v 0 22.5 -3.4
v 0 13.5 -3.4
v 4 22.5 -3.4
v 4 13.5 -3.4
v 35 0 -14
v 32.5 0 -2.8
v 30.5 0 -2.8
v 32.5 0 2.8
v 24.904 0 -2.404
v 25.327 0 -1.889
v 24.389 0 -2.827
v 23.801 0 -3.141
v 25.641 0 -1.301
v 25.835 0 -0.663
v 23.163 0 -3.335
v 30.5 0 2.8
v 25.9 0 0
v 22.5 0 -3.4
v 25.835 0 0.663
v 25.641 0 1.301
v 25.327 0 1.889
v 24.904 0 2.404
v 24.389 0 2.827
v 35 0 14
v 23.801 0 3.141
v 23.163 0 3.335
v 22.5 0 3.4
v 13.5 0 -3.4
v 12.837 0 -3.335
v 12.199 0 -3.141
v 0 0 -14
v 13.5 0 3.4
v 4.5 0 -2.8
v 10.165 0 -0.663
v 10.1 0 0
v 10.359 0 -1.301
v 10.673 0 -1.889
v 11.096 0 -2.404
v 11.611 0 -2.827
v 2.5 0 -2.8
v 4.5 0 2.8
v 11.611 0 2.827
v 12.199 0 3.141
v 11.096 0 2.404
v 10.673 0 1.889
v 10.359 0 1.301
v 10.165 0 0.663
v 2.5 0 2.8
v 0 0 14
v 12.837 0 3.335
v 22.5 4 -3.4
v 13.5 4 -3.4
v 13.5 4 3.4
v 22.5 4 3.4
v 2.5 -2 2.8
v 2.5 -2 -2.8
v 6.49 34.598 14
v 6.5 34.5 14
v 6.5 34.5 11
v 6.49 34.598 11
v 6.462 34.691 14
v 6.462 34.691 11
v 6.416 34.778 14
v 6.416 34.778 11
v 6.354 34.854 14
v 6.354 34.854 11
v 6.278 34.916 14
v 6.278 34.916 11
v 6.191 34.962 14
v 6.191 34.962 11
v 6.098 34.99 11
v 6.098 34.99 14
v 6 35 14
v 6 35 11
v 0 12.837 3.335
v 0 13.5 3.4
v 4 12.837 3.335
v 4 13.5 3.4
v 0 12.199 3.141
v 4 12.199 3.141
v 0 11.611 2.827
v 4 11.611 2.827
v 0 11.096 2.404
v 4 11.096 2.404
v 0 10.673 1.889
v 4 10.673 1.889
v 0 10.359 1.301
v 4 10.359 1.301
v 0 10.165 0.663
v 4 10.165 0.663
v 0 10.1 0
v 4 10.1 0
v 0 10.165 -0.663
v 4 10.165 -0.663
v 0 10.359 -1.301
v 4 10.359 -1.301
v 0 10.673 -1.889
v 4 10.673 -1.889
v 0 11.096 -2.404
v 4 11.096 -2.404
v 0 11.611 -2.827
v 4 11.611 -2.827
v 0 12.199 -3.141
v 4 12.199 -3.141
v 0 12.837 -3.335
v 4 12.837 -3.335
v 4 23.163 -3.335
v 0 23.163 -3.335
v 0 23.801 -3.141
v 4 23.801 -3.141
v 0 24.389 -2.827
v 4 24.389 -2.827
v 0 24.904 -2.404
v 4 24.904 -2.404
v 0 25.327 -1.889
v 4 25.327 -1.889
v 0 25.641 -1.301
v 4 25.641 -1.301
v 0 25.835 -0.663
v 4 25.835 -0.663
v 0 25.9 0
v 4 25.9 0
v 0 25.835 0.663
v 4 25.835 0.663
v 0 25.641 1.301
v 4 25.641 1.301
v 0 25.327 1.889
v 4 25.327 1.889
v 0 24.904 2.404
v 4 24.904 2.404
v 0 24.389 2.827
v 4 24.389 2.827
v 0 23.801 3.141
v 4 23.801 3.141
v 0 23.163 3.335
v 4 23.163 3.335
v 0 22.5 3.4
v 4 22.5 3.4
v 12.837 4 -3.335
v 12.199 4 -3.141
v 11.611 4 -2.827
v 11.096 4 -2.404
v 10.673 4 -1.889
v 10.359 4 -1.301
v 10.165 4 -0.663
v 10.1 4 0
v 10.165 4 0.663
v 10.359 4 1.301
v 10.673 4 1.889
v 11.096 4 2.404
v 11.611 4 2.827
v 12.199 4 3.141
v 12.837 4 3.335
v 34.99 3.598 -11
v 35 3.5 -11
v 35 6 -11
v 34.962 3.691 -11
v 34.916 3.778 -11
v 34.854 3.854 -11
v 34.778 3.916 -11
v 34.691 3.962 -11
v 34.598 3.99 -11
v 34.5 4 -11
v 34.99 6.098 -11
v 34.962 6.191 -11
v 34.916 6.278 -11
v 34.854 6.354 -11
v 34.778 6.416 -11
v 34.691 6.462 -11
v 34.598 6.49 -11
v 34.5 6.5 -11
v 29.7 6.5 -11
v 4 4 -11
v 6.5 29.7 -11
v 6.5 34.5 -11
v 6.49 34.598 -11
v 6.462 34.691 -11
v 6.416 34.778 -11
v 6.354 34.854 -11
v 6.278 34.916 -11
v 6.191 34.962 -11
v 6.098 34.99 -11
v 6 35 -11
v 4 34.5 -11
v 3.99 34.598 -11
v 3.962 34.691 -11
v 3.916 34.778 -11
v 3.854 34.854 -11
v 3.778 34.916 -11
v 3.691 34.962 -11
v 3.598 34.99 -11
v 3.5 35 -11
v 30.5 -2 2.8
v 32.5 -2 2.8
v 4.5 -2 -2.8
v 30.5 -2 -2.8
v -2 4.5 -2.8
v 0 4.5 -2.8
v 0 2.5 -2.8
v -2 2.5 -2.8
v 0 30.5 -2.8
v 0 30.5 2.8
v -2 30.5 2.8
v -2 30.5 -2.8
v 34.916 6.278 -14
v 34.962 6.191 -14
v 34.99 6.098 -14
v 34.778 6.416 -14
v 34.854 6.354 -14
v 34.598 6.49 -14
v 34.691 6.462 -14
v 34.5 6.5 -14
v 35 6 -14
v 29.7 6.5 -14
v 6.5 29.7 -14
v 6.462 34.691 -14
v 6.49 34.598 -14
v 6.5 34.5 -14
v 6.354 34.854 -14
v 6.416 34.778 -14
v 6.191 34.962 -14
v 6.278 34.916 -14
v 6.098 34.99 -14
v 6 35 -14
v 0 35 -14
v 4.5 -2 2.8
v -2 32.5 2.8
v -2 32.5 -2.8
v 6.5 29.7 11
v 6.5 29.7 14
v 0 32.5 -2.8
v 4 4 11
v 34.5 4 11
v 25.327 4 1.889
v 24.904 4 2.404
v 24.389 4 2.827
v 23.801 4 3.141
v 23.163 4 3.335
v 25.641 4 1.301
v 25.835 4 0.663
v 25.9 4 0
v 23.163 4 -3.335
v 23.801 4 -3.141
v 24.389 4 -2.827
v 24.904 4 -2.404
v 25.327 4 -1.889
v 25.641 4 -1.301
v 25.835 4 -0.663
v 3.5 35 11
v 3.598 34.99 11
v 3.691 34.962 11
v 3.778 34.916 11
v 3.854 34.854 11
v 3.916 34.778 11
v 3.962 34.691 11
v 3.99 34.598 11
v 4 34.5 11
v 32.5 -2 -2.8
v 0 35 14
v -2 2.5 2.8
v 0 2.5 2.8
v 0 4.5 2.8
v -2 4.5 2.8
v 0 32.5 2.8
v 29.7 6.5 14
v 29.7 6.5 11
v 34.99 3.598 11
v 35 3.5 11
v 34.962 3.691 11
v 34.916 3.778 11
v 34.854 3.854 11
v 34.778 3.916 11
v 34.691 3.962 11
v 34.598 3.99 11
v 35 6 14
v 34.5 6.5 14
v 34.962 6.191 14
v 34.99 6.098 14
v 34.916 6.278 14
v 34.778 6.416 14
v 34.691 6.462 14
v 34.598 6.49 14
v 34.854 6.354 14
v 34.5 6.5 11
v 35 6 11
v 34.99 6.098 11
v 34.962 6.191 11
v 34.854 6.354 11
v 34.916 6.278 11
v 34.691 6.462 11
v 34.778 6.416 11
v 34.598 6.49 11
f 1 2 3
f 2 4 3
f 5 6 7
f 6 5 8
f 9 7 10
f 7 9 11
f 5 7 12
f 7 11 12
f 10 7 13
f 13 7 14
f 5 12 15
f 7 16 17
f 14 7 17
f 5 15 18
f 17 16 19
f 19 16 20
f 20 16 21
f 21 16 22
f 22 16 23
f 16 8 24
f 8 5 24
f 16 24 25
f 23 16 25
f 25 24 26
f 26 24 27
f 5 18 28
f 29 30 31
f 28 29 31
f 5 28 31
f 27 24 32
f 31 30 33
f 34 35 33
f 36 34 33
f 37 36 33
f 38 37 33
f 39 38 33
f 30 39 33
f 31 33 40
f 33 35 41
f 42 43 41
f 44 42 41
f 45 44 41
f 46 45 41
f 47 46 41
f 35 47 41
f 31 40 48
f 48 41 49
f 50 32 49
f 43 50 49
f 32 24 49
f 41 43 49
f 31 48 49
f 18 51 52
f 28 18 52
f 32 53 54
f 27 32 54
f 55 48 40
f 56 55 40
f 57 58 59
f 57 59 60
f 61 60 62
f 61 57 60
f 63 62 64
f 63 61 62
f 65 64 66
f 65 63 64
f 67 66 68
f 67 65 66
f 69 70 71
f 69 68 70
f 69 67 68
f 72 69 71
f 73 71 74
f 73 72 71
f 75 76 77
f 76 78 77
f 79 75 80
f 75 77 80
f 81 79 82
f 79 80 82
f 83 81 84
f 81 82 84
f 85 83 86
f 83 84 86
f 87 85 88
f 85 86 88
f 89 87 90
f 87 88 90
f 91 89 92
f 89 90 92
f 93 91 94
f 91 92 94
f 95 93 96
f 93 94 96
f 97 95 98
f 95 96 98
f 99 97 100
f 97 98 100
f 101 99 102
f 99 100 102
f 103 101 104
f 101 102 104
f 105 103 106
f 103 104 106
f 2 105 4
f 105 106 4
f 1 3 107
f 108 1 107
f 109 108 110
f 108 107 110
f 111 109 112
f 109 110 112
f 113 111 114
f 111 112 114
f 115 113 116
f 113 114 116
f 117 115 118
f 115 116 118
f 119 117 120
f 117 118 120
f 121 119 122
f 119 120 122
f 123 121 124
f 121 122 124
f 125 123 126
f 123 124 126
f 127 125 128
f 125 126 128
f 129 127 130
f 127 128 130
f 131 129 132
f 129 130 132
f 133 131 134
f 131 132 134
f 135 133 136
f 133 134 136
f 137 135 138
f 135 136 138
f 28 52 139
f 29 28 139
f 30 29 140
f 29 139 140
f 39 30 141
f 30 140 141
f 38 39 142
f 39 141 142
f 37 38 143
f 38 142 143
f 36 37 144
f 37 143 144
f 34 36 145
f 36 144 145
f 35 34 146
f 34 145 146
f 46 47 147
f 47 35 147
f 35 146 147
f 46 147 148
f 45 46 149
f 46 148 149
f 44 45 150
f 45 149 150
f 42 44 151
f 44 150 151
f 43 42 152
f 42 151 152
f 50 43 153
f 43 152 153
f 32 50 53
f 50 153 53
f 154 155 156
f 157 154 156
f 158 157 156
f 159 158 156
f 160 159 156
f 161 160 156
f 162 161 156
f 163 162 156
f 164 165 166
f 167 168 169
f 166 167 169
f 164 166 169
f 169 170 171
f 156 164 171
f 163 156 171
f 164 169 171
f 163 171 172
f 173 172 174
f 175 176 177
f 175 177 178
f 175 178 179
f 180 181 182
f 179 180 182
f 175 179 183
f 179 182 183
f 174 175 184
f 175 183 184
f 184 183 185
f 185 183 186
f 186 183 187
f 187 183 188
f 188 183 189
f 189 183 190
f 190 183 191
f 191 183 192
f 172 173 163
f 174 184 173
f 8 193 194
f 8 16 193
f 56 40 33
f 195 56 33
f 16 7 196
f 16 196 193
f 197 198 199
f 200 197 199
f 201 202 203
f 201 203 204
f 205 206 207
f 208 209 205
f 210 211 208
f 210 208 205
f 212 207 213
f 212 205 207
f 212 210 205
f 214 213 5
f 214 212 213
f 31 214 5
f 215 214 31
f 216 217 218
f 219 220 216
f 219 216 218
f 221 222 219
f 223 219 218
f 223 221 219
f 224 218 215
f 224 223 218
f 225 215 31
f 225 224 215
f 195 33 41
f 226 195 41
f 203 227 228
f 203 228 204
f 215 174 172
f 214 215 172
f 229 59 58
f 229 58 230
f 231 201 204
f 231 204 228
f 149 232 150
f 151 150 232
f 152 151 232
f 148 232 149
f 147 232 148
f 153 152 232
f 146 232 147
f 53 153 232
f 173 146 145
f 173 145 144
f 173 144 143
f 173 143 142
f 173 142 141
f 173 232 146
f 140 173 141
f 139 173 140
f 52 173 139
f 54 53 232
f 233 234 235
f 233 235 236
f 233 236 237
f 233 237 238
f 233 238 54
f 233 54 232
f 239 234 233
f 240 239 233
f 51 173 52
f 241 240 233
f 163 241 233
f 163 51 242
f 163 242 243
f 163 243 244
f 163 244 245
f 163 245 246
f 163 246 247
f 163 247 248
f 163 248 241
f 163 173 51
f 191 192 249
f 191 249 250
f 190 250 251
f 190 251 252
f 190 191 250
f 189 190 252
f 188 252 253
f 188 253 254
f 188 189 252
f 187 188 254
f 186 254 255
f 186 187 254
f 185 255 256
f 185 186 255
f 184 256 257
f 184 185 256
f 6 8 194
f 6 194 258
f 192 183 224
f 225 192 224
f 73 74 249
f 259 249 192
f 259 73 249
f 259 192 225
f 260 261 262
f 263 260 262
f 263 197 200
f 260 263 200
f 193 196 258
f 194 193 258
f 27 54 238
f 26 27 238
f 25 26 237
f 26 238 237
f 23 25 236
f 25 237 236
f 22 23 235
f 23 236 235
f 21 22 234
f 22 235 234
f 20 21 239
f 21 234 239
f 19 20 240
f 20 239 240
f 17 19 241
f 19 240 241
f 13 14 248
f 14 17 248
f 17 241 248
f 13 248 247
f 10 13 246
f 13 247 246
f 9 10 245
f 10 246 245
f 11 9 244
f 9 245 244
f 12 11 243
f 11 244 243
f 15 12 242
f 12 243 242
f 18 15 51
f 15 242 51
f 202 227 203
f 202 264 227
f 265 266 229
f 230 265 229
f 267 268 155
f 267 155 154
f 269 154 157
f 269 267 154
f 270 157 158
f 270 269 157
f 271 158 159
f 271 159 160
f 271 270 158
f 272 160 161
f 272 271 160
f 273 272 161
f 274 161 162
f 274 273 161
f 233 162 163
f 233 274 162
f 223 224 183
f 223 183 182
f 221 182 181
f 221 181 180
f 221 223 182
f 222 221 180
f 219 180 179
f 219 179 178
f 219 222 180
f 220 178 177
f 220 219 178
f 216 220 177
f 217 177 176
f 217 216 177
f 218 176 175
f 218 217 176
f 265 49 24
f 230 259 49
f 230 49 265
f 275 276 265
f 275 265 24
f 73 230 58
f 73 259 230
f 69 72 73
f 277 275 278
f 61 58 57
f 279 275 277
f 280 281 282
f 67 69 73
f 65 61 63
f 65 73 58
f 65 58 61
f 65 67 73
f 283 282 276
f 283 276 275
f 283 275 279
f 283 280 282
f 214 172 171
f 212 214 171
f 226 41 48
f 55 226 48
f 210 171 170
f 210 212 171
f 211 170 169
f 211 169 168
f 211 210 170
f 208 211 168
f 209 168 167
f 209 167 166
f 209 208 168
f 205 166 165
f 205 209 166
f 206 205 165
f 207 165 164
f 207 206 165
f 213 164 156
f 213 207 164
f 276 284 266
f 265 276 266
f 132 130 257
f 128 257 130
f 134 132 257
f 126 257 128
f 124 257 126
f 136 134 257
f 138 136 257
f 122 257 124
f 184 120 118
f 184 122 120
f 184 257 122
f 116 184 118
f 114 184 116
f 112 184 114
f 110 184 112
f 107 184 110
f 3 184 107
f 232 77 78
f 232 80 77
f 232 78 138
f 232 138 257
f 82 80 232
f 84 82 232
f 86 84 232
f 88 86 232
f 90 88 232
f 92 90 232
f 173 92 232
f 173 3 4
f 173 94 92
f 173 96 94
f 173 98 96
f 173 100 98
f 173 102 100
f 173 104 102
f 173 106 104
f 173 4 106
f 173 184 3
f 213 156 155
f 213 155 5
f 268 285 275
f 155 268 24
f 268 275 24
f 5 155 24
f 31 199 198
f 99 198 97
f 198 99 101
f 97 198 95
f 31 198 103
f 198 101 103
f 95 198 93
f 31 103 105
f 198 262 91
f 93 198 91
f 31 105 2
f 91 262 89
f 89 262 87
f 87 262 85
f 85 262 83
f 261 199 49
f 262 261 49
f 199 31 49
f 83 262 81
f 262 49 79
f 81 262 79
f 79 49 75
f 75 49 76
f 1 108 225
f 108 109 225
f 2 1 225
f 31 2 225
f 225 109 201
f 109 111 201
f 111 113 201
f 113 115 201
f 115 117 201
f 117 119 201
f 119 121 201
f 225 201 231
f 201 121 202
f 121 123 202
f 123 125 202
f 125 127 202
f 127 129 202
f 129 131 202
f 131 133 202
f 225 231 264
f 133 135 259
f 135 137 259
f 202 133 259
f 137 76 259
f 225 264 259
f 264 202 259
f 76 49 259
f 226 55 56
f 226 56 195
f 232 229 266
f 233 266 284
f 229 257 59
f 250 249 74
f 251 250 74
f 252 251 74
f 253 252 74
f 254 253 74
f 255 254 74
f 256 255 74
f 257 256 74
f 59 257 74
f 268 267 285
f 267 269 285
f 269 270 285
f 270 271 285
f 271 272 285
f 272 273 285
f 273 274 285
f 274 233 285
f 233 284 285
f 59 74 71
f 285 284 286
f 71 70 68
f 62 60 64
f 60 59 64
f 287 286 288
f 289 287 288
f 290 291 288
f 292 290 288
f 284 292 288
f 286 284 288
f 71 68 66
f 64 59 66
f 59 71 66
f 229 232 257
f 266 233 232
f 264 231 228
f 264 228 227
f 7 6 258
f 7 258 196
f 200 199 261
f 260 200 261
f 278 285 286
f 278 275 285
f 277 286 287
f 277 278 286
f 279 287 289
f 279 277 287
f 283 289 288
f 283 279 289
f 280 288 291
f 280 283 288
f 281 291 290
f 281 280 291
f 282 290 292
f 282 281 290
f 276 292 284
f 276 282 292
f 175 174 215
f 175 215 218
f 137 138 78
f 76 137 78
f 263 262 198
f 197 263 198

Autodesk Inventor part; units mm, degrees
ref_plane "YZ Plane" through (0, 0, 0) normal (1, 0, 0) x (0, 1, 0)
sketch "Sketch1" plane through (0, 0, 0) normal (0, 0, 1) x (1, 0, 0)
  line L0 (0, 0) -> (0, 35)
  line L1 (0, 35) -> (4, 35)
  line L2 (4, 35) -> (4, 4)
  line L3 (4, 4) -> (35, 4)
  line L4 (35, 4) -> (35, 0)
  line L5 (35, 0) -> (0, 0)
  dimension "d8" = 35
  dimension "d10" = 4
  dimension "d11" = 4
  dimension "d12" = 35
extrude "Extrusion1" add sketch "Sketch1" along normal blind 11 and the other way blind 11
ref_plane "Work Plane1" through (0, 0, -11) normal (-0.7071, 0.7071, 0) x (0, 0, -1)
sketch "Sketch2" plane through (4, 4, -11) normal (1, 0, 0) x (0, 0, -1)
  line L0 (-11, 21.9) -> (-11, 6.1) construction
  line L1 (-14.4, 18.5) -> (-14.4, 9.5)
  line L2 (-7.6, 9.5) -> (-7.6, 18.5)
  arc A0 (-7.6, 18.5) -> (-14.4, 18.5) centre (-11, 18.5) ccw
  arc A1 (-14.4, 9.5) -> (-7.6, 9.5) centre (-11, 9.5) ccw
  line L3 (0, 0) -> (-22, 0) projected
  line L4 (-22, -4) -> (-11, -4) projected
  line L5 (-22, 0) -> (-22, 31) projected
  point P0 (-11, 14)
  dimension "d16" = 6.8
  dimension "d17" = 9
  dimension "d19" = 13.5
  dimension "d28" = 11
extrude "Extrusion2" cut sketch "Sketch2" against normal up to surface (4 mm away)
mirror "Mirror1" about plane through (0, 0, -11) normal (-0.7071, 0.7071, 0) of "Extrusion2"
sketch "Sketch3" plane through (0, 0, 11) normal (0, 0, 1) x (1, 0, 0)
  line L0 (4, 35) -> (0, 35) projected
  line L1 (0, 35) -> (6.5, 35)
  line L2 (6.5, 35) -> (6.5, 29.7)
  line L3 (35, 0) -> (35, 4) projected
  line L4 (35, 0) -> (35, 6.5)
  line L5 (35, 6.5) -> (29.7, 6.5)
  line L6 (29.7, 6.5) -> (6.5, 29.7)
  line L7 (0, 35) -> (0, 0) projected
  line L8 (0, 35) -> (0, 0)
  line L9 (0, 0) -> (35, 0)
  dimension "d22" = 6.5
  dimension "d23" = 5.3
  dimension "d24" = 6.5
  dimension "d25" = 5.3
ref_plane "Work Plane2" through (0, 0, 0) normal (0, 0, 1) x (1, 0, 0)
extrude "Extrusion3" add sketch "Sketch3" along normal blind 3
mirror "Mirror2" about plane through (0, 0, 0) normal (0, 0, 1) of "Extrusion3"
fillet "Fillet1" radius 0.5 6 edges at (35, 6.5, 12.5) (35, 6.5, -12.5) (6.5, 35, -12.5) (6.5, 35, 12.5) (35, 4, 0) (4, 35, 0)
sketch "Sketch4" plane through (0, 0, 14) normal (0, -1, 0) x (1, 0, 0)
  line L0 (35, -3) -> (35, -25) projected
  line L1 (35, -14) -> (0, -14) construction
  line L2 (4.5, -11.2) -> (2.5, -11.2)
  line L3 (2.5, -11.2) -> (2.5, -16.8)
  line L4 (2.5, -16.8) -> (4.5, -16.8)
  line L5 (4.5, -16.8) -> (4.5, -11.2)
  line L6 (4.5, -11.2) -> (2.5, -16.8) construction
  line L7 (2.5, -11.2) -> (4.5, -16.8) construction
  line L8 (0, -28) -> (0, 0) projected
  line L9 (30.5, -11.2) -> (32.5, -11.2)
  line L10 (32.5, -11.2) -> (32.5, -16.8)
  line L11 (32.5, -16.8) -> (30.5, -16.8)
  line L12 (30.5, -16.8) -> (30.5, -11.2)
  line L13 (30.5, -11.2) -> (32.5, -16.8) construction
  line L14 (32.5, -11.2) -> (30.5, -16.8) construction
  point P0 (3.5, -14)
  point P1 (31.5, -14)
  dimension "d34" = 2
  dimension "d35" = 5.6
  dimension "d36" = 2.5
  dimension "d37" = 5.6
  dimension "d38" = 2
  dimension "d39" = 2.5
extrude "Extrusion4" add sketch "Sketch4" along normal blind 2
mirror "Mirror3" about plane through (0, 0, -11) normal (-0.7071, 0.7071, 0) of "Extrusion4"
properties part number "L Angle Bracket 30x30 31082023"
